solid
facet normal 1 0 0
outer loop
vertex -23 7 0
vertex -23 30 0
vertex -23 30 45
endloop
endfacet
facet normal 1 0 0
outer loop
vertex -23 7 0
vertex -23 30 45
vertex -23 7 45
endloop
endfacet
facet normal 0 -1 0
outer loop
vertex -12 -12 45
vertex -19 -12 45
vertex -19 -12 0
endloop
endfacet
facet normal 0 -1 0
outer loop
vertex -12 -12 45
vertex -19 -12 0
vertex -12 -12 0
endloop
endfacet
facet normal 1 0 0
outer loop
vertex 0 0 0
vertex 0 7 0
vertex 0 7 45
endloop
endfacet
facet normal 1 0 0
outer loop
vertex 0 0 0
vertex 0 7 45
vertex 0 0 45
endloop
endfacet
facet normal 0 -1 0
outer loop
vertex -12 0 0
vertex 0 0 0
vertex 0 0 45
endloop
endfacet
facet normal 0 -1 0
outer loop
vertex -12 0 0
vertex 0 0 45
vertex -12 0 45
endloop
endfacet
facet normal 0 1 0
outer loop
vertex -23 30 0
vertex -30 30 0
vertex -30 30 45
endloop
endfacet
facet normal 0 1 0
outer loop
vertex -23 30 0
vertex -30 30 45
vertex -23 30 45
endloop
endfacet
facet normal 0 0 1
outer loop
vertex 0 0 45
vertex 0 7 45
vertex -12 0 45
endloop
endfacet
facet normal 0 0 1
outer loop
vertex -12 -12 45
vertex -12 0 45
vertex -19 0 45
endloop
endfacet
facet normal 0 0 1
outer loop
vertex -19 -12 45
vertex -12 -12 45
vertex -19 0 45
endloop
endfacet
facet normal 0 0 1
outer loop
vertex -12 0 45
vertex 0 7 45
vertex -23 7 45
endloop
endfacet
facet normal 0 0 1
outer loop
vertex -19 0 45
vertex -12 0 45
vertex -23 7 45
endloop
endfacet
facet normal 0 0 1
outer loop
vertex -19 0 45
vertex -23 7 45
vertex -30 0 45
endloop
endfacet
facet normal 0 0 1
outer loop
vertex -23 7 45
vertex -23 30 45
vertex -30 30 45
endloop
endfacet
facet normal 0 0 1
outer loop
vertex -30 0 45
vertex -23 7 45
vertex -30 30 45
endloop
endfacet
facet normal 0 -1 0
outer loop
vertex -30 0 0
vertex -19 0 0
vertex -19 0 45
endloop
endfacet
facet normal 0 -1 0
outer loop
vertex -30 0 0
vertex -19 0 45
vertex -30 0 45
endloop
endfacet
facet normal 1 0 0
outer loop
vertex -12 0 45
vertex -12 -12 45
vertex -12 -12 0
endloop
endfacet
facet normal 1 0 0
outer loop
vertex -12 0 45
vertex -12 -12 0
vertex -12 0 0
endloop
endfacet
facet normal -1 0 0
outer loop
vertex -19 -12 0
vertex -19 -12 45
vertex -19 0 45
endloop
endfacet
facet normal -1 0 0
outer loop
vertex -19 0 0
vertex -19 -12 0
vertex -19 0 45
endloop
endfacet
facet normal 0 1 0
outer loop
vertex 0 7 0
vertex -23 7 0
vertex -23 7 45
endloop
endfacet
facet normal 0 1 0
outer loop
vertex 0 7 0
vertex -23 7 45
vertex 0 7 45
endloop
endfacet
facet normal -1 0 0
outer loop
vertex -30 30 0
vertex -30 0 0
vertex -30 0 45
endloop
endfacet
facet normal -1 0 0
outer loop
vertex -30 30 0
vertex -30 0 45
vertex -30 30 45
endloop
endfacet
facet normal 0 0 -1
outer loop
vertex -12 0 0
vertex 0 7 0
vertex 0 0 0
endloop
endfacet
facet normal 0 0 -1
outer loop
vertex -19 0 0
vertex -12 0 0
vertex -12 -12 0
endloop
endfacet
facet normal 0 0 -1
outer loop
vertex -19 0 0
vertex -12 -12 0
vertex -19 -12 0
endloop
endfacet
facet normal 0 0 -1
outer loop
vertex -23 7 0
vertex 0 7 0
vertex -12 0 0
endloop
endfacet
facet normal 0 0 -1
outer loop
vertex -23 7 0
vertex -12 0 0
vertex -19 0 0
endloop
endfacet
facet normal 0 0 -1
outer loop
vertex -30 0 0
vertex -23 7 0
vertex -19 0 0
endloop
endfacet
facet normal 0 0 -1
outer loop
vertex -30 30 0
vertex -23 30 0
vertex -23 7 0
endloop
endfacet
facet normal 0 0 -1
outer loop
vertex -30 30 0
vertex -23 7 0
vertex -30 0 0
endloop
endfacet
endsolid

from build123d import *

# Parameters (mm, degrees)
EXTRUDE_1_DEPTH = 45
SKETCH_2_W      = 7
SKETCH_2_H      = 12
EXTRUDE_2_DEPTH = 45


with BuildPart() as part:
    # Эскиз1 → Бобышка-Вытянуть1 (new body)
    with BuildSketch(Plane.XY):
        Polygon((0, 0), (-30, 0), (-30, 30), (-23, 30), (-23, 7), (0, 7), align=None)
    extrude(amount=EXTRUDE_1_DEPTH)

    # Эскиз2 → Бобышка-Вытянуть2 (add)
    with BuildSketch(Plane.XY.offset(45)):
        with Locations((-15.5, -6)):
            Rectangle(SKETCH_2_W, SKETCH_2_H)
    extrude(amount=-EXTRUDE_2_DEPTH)


solid = part.part
